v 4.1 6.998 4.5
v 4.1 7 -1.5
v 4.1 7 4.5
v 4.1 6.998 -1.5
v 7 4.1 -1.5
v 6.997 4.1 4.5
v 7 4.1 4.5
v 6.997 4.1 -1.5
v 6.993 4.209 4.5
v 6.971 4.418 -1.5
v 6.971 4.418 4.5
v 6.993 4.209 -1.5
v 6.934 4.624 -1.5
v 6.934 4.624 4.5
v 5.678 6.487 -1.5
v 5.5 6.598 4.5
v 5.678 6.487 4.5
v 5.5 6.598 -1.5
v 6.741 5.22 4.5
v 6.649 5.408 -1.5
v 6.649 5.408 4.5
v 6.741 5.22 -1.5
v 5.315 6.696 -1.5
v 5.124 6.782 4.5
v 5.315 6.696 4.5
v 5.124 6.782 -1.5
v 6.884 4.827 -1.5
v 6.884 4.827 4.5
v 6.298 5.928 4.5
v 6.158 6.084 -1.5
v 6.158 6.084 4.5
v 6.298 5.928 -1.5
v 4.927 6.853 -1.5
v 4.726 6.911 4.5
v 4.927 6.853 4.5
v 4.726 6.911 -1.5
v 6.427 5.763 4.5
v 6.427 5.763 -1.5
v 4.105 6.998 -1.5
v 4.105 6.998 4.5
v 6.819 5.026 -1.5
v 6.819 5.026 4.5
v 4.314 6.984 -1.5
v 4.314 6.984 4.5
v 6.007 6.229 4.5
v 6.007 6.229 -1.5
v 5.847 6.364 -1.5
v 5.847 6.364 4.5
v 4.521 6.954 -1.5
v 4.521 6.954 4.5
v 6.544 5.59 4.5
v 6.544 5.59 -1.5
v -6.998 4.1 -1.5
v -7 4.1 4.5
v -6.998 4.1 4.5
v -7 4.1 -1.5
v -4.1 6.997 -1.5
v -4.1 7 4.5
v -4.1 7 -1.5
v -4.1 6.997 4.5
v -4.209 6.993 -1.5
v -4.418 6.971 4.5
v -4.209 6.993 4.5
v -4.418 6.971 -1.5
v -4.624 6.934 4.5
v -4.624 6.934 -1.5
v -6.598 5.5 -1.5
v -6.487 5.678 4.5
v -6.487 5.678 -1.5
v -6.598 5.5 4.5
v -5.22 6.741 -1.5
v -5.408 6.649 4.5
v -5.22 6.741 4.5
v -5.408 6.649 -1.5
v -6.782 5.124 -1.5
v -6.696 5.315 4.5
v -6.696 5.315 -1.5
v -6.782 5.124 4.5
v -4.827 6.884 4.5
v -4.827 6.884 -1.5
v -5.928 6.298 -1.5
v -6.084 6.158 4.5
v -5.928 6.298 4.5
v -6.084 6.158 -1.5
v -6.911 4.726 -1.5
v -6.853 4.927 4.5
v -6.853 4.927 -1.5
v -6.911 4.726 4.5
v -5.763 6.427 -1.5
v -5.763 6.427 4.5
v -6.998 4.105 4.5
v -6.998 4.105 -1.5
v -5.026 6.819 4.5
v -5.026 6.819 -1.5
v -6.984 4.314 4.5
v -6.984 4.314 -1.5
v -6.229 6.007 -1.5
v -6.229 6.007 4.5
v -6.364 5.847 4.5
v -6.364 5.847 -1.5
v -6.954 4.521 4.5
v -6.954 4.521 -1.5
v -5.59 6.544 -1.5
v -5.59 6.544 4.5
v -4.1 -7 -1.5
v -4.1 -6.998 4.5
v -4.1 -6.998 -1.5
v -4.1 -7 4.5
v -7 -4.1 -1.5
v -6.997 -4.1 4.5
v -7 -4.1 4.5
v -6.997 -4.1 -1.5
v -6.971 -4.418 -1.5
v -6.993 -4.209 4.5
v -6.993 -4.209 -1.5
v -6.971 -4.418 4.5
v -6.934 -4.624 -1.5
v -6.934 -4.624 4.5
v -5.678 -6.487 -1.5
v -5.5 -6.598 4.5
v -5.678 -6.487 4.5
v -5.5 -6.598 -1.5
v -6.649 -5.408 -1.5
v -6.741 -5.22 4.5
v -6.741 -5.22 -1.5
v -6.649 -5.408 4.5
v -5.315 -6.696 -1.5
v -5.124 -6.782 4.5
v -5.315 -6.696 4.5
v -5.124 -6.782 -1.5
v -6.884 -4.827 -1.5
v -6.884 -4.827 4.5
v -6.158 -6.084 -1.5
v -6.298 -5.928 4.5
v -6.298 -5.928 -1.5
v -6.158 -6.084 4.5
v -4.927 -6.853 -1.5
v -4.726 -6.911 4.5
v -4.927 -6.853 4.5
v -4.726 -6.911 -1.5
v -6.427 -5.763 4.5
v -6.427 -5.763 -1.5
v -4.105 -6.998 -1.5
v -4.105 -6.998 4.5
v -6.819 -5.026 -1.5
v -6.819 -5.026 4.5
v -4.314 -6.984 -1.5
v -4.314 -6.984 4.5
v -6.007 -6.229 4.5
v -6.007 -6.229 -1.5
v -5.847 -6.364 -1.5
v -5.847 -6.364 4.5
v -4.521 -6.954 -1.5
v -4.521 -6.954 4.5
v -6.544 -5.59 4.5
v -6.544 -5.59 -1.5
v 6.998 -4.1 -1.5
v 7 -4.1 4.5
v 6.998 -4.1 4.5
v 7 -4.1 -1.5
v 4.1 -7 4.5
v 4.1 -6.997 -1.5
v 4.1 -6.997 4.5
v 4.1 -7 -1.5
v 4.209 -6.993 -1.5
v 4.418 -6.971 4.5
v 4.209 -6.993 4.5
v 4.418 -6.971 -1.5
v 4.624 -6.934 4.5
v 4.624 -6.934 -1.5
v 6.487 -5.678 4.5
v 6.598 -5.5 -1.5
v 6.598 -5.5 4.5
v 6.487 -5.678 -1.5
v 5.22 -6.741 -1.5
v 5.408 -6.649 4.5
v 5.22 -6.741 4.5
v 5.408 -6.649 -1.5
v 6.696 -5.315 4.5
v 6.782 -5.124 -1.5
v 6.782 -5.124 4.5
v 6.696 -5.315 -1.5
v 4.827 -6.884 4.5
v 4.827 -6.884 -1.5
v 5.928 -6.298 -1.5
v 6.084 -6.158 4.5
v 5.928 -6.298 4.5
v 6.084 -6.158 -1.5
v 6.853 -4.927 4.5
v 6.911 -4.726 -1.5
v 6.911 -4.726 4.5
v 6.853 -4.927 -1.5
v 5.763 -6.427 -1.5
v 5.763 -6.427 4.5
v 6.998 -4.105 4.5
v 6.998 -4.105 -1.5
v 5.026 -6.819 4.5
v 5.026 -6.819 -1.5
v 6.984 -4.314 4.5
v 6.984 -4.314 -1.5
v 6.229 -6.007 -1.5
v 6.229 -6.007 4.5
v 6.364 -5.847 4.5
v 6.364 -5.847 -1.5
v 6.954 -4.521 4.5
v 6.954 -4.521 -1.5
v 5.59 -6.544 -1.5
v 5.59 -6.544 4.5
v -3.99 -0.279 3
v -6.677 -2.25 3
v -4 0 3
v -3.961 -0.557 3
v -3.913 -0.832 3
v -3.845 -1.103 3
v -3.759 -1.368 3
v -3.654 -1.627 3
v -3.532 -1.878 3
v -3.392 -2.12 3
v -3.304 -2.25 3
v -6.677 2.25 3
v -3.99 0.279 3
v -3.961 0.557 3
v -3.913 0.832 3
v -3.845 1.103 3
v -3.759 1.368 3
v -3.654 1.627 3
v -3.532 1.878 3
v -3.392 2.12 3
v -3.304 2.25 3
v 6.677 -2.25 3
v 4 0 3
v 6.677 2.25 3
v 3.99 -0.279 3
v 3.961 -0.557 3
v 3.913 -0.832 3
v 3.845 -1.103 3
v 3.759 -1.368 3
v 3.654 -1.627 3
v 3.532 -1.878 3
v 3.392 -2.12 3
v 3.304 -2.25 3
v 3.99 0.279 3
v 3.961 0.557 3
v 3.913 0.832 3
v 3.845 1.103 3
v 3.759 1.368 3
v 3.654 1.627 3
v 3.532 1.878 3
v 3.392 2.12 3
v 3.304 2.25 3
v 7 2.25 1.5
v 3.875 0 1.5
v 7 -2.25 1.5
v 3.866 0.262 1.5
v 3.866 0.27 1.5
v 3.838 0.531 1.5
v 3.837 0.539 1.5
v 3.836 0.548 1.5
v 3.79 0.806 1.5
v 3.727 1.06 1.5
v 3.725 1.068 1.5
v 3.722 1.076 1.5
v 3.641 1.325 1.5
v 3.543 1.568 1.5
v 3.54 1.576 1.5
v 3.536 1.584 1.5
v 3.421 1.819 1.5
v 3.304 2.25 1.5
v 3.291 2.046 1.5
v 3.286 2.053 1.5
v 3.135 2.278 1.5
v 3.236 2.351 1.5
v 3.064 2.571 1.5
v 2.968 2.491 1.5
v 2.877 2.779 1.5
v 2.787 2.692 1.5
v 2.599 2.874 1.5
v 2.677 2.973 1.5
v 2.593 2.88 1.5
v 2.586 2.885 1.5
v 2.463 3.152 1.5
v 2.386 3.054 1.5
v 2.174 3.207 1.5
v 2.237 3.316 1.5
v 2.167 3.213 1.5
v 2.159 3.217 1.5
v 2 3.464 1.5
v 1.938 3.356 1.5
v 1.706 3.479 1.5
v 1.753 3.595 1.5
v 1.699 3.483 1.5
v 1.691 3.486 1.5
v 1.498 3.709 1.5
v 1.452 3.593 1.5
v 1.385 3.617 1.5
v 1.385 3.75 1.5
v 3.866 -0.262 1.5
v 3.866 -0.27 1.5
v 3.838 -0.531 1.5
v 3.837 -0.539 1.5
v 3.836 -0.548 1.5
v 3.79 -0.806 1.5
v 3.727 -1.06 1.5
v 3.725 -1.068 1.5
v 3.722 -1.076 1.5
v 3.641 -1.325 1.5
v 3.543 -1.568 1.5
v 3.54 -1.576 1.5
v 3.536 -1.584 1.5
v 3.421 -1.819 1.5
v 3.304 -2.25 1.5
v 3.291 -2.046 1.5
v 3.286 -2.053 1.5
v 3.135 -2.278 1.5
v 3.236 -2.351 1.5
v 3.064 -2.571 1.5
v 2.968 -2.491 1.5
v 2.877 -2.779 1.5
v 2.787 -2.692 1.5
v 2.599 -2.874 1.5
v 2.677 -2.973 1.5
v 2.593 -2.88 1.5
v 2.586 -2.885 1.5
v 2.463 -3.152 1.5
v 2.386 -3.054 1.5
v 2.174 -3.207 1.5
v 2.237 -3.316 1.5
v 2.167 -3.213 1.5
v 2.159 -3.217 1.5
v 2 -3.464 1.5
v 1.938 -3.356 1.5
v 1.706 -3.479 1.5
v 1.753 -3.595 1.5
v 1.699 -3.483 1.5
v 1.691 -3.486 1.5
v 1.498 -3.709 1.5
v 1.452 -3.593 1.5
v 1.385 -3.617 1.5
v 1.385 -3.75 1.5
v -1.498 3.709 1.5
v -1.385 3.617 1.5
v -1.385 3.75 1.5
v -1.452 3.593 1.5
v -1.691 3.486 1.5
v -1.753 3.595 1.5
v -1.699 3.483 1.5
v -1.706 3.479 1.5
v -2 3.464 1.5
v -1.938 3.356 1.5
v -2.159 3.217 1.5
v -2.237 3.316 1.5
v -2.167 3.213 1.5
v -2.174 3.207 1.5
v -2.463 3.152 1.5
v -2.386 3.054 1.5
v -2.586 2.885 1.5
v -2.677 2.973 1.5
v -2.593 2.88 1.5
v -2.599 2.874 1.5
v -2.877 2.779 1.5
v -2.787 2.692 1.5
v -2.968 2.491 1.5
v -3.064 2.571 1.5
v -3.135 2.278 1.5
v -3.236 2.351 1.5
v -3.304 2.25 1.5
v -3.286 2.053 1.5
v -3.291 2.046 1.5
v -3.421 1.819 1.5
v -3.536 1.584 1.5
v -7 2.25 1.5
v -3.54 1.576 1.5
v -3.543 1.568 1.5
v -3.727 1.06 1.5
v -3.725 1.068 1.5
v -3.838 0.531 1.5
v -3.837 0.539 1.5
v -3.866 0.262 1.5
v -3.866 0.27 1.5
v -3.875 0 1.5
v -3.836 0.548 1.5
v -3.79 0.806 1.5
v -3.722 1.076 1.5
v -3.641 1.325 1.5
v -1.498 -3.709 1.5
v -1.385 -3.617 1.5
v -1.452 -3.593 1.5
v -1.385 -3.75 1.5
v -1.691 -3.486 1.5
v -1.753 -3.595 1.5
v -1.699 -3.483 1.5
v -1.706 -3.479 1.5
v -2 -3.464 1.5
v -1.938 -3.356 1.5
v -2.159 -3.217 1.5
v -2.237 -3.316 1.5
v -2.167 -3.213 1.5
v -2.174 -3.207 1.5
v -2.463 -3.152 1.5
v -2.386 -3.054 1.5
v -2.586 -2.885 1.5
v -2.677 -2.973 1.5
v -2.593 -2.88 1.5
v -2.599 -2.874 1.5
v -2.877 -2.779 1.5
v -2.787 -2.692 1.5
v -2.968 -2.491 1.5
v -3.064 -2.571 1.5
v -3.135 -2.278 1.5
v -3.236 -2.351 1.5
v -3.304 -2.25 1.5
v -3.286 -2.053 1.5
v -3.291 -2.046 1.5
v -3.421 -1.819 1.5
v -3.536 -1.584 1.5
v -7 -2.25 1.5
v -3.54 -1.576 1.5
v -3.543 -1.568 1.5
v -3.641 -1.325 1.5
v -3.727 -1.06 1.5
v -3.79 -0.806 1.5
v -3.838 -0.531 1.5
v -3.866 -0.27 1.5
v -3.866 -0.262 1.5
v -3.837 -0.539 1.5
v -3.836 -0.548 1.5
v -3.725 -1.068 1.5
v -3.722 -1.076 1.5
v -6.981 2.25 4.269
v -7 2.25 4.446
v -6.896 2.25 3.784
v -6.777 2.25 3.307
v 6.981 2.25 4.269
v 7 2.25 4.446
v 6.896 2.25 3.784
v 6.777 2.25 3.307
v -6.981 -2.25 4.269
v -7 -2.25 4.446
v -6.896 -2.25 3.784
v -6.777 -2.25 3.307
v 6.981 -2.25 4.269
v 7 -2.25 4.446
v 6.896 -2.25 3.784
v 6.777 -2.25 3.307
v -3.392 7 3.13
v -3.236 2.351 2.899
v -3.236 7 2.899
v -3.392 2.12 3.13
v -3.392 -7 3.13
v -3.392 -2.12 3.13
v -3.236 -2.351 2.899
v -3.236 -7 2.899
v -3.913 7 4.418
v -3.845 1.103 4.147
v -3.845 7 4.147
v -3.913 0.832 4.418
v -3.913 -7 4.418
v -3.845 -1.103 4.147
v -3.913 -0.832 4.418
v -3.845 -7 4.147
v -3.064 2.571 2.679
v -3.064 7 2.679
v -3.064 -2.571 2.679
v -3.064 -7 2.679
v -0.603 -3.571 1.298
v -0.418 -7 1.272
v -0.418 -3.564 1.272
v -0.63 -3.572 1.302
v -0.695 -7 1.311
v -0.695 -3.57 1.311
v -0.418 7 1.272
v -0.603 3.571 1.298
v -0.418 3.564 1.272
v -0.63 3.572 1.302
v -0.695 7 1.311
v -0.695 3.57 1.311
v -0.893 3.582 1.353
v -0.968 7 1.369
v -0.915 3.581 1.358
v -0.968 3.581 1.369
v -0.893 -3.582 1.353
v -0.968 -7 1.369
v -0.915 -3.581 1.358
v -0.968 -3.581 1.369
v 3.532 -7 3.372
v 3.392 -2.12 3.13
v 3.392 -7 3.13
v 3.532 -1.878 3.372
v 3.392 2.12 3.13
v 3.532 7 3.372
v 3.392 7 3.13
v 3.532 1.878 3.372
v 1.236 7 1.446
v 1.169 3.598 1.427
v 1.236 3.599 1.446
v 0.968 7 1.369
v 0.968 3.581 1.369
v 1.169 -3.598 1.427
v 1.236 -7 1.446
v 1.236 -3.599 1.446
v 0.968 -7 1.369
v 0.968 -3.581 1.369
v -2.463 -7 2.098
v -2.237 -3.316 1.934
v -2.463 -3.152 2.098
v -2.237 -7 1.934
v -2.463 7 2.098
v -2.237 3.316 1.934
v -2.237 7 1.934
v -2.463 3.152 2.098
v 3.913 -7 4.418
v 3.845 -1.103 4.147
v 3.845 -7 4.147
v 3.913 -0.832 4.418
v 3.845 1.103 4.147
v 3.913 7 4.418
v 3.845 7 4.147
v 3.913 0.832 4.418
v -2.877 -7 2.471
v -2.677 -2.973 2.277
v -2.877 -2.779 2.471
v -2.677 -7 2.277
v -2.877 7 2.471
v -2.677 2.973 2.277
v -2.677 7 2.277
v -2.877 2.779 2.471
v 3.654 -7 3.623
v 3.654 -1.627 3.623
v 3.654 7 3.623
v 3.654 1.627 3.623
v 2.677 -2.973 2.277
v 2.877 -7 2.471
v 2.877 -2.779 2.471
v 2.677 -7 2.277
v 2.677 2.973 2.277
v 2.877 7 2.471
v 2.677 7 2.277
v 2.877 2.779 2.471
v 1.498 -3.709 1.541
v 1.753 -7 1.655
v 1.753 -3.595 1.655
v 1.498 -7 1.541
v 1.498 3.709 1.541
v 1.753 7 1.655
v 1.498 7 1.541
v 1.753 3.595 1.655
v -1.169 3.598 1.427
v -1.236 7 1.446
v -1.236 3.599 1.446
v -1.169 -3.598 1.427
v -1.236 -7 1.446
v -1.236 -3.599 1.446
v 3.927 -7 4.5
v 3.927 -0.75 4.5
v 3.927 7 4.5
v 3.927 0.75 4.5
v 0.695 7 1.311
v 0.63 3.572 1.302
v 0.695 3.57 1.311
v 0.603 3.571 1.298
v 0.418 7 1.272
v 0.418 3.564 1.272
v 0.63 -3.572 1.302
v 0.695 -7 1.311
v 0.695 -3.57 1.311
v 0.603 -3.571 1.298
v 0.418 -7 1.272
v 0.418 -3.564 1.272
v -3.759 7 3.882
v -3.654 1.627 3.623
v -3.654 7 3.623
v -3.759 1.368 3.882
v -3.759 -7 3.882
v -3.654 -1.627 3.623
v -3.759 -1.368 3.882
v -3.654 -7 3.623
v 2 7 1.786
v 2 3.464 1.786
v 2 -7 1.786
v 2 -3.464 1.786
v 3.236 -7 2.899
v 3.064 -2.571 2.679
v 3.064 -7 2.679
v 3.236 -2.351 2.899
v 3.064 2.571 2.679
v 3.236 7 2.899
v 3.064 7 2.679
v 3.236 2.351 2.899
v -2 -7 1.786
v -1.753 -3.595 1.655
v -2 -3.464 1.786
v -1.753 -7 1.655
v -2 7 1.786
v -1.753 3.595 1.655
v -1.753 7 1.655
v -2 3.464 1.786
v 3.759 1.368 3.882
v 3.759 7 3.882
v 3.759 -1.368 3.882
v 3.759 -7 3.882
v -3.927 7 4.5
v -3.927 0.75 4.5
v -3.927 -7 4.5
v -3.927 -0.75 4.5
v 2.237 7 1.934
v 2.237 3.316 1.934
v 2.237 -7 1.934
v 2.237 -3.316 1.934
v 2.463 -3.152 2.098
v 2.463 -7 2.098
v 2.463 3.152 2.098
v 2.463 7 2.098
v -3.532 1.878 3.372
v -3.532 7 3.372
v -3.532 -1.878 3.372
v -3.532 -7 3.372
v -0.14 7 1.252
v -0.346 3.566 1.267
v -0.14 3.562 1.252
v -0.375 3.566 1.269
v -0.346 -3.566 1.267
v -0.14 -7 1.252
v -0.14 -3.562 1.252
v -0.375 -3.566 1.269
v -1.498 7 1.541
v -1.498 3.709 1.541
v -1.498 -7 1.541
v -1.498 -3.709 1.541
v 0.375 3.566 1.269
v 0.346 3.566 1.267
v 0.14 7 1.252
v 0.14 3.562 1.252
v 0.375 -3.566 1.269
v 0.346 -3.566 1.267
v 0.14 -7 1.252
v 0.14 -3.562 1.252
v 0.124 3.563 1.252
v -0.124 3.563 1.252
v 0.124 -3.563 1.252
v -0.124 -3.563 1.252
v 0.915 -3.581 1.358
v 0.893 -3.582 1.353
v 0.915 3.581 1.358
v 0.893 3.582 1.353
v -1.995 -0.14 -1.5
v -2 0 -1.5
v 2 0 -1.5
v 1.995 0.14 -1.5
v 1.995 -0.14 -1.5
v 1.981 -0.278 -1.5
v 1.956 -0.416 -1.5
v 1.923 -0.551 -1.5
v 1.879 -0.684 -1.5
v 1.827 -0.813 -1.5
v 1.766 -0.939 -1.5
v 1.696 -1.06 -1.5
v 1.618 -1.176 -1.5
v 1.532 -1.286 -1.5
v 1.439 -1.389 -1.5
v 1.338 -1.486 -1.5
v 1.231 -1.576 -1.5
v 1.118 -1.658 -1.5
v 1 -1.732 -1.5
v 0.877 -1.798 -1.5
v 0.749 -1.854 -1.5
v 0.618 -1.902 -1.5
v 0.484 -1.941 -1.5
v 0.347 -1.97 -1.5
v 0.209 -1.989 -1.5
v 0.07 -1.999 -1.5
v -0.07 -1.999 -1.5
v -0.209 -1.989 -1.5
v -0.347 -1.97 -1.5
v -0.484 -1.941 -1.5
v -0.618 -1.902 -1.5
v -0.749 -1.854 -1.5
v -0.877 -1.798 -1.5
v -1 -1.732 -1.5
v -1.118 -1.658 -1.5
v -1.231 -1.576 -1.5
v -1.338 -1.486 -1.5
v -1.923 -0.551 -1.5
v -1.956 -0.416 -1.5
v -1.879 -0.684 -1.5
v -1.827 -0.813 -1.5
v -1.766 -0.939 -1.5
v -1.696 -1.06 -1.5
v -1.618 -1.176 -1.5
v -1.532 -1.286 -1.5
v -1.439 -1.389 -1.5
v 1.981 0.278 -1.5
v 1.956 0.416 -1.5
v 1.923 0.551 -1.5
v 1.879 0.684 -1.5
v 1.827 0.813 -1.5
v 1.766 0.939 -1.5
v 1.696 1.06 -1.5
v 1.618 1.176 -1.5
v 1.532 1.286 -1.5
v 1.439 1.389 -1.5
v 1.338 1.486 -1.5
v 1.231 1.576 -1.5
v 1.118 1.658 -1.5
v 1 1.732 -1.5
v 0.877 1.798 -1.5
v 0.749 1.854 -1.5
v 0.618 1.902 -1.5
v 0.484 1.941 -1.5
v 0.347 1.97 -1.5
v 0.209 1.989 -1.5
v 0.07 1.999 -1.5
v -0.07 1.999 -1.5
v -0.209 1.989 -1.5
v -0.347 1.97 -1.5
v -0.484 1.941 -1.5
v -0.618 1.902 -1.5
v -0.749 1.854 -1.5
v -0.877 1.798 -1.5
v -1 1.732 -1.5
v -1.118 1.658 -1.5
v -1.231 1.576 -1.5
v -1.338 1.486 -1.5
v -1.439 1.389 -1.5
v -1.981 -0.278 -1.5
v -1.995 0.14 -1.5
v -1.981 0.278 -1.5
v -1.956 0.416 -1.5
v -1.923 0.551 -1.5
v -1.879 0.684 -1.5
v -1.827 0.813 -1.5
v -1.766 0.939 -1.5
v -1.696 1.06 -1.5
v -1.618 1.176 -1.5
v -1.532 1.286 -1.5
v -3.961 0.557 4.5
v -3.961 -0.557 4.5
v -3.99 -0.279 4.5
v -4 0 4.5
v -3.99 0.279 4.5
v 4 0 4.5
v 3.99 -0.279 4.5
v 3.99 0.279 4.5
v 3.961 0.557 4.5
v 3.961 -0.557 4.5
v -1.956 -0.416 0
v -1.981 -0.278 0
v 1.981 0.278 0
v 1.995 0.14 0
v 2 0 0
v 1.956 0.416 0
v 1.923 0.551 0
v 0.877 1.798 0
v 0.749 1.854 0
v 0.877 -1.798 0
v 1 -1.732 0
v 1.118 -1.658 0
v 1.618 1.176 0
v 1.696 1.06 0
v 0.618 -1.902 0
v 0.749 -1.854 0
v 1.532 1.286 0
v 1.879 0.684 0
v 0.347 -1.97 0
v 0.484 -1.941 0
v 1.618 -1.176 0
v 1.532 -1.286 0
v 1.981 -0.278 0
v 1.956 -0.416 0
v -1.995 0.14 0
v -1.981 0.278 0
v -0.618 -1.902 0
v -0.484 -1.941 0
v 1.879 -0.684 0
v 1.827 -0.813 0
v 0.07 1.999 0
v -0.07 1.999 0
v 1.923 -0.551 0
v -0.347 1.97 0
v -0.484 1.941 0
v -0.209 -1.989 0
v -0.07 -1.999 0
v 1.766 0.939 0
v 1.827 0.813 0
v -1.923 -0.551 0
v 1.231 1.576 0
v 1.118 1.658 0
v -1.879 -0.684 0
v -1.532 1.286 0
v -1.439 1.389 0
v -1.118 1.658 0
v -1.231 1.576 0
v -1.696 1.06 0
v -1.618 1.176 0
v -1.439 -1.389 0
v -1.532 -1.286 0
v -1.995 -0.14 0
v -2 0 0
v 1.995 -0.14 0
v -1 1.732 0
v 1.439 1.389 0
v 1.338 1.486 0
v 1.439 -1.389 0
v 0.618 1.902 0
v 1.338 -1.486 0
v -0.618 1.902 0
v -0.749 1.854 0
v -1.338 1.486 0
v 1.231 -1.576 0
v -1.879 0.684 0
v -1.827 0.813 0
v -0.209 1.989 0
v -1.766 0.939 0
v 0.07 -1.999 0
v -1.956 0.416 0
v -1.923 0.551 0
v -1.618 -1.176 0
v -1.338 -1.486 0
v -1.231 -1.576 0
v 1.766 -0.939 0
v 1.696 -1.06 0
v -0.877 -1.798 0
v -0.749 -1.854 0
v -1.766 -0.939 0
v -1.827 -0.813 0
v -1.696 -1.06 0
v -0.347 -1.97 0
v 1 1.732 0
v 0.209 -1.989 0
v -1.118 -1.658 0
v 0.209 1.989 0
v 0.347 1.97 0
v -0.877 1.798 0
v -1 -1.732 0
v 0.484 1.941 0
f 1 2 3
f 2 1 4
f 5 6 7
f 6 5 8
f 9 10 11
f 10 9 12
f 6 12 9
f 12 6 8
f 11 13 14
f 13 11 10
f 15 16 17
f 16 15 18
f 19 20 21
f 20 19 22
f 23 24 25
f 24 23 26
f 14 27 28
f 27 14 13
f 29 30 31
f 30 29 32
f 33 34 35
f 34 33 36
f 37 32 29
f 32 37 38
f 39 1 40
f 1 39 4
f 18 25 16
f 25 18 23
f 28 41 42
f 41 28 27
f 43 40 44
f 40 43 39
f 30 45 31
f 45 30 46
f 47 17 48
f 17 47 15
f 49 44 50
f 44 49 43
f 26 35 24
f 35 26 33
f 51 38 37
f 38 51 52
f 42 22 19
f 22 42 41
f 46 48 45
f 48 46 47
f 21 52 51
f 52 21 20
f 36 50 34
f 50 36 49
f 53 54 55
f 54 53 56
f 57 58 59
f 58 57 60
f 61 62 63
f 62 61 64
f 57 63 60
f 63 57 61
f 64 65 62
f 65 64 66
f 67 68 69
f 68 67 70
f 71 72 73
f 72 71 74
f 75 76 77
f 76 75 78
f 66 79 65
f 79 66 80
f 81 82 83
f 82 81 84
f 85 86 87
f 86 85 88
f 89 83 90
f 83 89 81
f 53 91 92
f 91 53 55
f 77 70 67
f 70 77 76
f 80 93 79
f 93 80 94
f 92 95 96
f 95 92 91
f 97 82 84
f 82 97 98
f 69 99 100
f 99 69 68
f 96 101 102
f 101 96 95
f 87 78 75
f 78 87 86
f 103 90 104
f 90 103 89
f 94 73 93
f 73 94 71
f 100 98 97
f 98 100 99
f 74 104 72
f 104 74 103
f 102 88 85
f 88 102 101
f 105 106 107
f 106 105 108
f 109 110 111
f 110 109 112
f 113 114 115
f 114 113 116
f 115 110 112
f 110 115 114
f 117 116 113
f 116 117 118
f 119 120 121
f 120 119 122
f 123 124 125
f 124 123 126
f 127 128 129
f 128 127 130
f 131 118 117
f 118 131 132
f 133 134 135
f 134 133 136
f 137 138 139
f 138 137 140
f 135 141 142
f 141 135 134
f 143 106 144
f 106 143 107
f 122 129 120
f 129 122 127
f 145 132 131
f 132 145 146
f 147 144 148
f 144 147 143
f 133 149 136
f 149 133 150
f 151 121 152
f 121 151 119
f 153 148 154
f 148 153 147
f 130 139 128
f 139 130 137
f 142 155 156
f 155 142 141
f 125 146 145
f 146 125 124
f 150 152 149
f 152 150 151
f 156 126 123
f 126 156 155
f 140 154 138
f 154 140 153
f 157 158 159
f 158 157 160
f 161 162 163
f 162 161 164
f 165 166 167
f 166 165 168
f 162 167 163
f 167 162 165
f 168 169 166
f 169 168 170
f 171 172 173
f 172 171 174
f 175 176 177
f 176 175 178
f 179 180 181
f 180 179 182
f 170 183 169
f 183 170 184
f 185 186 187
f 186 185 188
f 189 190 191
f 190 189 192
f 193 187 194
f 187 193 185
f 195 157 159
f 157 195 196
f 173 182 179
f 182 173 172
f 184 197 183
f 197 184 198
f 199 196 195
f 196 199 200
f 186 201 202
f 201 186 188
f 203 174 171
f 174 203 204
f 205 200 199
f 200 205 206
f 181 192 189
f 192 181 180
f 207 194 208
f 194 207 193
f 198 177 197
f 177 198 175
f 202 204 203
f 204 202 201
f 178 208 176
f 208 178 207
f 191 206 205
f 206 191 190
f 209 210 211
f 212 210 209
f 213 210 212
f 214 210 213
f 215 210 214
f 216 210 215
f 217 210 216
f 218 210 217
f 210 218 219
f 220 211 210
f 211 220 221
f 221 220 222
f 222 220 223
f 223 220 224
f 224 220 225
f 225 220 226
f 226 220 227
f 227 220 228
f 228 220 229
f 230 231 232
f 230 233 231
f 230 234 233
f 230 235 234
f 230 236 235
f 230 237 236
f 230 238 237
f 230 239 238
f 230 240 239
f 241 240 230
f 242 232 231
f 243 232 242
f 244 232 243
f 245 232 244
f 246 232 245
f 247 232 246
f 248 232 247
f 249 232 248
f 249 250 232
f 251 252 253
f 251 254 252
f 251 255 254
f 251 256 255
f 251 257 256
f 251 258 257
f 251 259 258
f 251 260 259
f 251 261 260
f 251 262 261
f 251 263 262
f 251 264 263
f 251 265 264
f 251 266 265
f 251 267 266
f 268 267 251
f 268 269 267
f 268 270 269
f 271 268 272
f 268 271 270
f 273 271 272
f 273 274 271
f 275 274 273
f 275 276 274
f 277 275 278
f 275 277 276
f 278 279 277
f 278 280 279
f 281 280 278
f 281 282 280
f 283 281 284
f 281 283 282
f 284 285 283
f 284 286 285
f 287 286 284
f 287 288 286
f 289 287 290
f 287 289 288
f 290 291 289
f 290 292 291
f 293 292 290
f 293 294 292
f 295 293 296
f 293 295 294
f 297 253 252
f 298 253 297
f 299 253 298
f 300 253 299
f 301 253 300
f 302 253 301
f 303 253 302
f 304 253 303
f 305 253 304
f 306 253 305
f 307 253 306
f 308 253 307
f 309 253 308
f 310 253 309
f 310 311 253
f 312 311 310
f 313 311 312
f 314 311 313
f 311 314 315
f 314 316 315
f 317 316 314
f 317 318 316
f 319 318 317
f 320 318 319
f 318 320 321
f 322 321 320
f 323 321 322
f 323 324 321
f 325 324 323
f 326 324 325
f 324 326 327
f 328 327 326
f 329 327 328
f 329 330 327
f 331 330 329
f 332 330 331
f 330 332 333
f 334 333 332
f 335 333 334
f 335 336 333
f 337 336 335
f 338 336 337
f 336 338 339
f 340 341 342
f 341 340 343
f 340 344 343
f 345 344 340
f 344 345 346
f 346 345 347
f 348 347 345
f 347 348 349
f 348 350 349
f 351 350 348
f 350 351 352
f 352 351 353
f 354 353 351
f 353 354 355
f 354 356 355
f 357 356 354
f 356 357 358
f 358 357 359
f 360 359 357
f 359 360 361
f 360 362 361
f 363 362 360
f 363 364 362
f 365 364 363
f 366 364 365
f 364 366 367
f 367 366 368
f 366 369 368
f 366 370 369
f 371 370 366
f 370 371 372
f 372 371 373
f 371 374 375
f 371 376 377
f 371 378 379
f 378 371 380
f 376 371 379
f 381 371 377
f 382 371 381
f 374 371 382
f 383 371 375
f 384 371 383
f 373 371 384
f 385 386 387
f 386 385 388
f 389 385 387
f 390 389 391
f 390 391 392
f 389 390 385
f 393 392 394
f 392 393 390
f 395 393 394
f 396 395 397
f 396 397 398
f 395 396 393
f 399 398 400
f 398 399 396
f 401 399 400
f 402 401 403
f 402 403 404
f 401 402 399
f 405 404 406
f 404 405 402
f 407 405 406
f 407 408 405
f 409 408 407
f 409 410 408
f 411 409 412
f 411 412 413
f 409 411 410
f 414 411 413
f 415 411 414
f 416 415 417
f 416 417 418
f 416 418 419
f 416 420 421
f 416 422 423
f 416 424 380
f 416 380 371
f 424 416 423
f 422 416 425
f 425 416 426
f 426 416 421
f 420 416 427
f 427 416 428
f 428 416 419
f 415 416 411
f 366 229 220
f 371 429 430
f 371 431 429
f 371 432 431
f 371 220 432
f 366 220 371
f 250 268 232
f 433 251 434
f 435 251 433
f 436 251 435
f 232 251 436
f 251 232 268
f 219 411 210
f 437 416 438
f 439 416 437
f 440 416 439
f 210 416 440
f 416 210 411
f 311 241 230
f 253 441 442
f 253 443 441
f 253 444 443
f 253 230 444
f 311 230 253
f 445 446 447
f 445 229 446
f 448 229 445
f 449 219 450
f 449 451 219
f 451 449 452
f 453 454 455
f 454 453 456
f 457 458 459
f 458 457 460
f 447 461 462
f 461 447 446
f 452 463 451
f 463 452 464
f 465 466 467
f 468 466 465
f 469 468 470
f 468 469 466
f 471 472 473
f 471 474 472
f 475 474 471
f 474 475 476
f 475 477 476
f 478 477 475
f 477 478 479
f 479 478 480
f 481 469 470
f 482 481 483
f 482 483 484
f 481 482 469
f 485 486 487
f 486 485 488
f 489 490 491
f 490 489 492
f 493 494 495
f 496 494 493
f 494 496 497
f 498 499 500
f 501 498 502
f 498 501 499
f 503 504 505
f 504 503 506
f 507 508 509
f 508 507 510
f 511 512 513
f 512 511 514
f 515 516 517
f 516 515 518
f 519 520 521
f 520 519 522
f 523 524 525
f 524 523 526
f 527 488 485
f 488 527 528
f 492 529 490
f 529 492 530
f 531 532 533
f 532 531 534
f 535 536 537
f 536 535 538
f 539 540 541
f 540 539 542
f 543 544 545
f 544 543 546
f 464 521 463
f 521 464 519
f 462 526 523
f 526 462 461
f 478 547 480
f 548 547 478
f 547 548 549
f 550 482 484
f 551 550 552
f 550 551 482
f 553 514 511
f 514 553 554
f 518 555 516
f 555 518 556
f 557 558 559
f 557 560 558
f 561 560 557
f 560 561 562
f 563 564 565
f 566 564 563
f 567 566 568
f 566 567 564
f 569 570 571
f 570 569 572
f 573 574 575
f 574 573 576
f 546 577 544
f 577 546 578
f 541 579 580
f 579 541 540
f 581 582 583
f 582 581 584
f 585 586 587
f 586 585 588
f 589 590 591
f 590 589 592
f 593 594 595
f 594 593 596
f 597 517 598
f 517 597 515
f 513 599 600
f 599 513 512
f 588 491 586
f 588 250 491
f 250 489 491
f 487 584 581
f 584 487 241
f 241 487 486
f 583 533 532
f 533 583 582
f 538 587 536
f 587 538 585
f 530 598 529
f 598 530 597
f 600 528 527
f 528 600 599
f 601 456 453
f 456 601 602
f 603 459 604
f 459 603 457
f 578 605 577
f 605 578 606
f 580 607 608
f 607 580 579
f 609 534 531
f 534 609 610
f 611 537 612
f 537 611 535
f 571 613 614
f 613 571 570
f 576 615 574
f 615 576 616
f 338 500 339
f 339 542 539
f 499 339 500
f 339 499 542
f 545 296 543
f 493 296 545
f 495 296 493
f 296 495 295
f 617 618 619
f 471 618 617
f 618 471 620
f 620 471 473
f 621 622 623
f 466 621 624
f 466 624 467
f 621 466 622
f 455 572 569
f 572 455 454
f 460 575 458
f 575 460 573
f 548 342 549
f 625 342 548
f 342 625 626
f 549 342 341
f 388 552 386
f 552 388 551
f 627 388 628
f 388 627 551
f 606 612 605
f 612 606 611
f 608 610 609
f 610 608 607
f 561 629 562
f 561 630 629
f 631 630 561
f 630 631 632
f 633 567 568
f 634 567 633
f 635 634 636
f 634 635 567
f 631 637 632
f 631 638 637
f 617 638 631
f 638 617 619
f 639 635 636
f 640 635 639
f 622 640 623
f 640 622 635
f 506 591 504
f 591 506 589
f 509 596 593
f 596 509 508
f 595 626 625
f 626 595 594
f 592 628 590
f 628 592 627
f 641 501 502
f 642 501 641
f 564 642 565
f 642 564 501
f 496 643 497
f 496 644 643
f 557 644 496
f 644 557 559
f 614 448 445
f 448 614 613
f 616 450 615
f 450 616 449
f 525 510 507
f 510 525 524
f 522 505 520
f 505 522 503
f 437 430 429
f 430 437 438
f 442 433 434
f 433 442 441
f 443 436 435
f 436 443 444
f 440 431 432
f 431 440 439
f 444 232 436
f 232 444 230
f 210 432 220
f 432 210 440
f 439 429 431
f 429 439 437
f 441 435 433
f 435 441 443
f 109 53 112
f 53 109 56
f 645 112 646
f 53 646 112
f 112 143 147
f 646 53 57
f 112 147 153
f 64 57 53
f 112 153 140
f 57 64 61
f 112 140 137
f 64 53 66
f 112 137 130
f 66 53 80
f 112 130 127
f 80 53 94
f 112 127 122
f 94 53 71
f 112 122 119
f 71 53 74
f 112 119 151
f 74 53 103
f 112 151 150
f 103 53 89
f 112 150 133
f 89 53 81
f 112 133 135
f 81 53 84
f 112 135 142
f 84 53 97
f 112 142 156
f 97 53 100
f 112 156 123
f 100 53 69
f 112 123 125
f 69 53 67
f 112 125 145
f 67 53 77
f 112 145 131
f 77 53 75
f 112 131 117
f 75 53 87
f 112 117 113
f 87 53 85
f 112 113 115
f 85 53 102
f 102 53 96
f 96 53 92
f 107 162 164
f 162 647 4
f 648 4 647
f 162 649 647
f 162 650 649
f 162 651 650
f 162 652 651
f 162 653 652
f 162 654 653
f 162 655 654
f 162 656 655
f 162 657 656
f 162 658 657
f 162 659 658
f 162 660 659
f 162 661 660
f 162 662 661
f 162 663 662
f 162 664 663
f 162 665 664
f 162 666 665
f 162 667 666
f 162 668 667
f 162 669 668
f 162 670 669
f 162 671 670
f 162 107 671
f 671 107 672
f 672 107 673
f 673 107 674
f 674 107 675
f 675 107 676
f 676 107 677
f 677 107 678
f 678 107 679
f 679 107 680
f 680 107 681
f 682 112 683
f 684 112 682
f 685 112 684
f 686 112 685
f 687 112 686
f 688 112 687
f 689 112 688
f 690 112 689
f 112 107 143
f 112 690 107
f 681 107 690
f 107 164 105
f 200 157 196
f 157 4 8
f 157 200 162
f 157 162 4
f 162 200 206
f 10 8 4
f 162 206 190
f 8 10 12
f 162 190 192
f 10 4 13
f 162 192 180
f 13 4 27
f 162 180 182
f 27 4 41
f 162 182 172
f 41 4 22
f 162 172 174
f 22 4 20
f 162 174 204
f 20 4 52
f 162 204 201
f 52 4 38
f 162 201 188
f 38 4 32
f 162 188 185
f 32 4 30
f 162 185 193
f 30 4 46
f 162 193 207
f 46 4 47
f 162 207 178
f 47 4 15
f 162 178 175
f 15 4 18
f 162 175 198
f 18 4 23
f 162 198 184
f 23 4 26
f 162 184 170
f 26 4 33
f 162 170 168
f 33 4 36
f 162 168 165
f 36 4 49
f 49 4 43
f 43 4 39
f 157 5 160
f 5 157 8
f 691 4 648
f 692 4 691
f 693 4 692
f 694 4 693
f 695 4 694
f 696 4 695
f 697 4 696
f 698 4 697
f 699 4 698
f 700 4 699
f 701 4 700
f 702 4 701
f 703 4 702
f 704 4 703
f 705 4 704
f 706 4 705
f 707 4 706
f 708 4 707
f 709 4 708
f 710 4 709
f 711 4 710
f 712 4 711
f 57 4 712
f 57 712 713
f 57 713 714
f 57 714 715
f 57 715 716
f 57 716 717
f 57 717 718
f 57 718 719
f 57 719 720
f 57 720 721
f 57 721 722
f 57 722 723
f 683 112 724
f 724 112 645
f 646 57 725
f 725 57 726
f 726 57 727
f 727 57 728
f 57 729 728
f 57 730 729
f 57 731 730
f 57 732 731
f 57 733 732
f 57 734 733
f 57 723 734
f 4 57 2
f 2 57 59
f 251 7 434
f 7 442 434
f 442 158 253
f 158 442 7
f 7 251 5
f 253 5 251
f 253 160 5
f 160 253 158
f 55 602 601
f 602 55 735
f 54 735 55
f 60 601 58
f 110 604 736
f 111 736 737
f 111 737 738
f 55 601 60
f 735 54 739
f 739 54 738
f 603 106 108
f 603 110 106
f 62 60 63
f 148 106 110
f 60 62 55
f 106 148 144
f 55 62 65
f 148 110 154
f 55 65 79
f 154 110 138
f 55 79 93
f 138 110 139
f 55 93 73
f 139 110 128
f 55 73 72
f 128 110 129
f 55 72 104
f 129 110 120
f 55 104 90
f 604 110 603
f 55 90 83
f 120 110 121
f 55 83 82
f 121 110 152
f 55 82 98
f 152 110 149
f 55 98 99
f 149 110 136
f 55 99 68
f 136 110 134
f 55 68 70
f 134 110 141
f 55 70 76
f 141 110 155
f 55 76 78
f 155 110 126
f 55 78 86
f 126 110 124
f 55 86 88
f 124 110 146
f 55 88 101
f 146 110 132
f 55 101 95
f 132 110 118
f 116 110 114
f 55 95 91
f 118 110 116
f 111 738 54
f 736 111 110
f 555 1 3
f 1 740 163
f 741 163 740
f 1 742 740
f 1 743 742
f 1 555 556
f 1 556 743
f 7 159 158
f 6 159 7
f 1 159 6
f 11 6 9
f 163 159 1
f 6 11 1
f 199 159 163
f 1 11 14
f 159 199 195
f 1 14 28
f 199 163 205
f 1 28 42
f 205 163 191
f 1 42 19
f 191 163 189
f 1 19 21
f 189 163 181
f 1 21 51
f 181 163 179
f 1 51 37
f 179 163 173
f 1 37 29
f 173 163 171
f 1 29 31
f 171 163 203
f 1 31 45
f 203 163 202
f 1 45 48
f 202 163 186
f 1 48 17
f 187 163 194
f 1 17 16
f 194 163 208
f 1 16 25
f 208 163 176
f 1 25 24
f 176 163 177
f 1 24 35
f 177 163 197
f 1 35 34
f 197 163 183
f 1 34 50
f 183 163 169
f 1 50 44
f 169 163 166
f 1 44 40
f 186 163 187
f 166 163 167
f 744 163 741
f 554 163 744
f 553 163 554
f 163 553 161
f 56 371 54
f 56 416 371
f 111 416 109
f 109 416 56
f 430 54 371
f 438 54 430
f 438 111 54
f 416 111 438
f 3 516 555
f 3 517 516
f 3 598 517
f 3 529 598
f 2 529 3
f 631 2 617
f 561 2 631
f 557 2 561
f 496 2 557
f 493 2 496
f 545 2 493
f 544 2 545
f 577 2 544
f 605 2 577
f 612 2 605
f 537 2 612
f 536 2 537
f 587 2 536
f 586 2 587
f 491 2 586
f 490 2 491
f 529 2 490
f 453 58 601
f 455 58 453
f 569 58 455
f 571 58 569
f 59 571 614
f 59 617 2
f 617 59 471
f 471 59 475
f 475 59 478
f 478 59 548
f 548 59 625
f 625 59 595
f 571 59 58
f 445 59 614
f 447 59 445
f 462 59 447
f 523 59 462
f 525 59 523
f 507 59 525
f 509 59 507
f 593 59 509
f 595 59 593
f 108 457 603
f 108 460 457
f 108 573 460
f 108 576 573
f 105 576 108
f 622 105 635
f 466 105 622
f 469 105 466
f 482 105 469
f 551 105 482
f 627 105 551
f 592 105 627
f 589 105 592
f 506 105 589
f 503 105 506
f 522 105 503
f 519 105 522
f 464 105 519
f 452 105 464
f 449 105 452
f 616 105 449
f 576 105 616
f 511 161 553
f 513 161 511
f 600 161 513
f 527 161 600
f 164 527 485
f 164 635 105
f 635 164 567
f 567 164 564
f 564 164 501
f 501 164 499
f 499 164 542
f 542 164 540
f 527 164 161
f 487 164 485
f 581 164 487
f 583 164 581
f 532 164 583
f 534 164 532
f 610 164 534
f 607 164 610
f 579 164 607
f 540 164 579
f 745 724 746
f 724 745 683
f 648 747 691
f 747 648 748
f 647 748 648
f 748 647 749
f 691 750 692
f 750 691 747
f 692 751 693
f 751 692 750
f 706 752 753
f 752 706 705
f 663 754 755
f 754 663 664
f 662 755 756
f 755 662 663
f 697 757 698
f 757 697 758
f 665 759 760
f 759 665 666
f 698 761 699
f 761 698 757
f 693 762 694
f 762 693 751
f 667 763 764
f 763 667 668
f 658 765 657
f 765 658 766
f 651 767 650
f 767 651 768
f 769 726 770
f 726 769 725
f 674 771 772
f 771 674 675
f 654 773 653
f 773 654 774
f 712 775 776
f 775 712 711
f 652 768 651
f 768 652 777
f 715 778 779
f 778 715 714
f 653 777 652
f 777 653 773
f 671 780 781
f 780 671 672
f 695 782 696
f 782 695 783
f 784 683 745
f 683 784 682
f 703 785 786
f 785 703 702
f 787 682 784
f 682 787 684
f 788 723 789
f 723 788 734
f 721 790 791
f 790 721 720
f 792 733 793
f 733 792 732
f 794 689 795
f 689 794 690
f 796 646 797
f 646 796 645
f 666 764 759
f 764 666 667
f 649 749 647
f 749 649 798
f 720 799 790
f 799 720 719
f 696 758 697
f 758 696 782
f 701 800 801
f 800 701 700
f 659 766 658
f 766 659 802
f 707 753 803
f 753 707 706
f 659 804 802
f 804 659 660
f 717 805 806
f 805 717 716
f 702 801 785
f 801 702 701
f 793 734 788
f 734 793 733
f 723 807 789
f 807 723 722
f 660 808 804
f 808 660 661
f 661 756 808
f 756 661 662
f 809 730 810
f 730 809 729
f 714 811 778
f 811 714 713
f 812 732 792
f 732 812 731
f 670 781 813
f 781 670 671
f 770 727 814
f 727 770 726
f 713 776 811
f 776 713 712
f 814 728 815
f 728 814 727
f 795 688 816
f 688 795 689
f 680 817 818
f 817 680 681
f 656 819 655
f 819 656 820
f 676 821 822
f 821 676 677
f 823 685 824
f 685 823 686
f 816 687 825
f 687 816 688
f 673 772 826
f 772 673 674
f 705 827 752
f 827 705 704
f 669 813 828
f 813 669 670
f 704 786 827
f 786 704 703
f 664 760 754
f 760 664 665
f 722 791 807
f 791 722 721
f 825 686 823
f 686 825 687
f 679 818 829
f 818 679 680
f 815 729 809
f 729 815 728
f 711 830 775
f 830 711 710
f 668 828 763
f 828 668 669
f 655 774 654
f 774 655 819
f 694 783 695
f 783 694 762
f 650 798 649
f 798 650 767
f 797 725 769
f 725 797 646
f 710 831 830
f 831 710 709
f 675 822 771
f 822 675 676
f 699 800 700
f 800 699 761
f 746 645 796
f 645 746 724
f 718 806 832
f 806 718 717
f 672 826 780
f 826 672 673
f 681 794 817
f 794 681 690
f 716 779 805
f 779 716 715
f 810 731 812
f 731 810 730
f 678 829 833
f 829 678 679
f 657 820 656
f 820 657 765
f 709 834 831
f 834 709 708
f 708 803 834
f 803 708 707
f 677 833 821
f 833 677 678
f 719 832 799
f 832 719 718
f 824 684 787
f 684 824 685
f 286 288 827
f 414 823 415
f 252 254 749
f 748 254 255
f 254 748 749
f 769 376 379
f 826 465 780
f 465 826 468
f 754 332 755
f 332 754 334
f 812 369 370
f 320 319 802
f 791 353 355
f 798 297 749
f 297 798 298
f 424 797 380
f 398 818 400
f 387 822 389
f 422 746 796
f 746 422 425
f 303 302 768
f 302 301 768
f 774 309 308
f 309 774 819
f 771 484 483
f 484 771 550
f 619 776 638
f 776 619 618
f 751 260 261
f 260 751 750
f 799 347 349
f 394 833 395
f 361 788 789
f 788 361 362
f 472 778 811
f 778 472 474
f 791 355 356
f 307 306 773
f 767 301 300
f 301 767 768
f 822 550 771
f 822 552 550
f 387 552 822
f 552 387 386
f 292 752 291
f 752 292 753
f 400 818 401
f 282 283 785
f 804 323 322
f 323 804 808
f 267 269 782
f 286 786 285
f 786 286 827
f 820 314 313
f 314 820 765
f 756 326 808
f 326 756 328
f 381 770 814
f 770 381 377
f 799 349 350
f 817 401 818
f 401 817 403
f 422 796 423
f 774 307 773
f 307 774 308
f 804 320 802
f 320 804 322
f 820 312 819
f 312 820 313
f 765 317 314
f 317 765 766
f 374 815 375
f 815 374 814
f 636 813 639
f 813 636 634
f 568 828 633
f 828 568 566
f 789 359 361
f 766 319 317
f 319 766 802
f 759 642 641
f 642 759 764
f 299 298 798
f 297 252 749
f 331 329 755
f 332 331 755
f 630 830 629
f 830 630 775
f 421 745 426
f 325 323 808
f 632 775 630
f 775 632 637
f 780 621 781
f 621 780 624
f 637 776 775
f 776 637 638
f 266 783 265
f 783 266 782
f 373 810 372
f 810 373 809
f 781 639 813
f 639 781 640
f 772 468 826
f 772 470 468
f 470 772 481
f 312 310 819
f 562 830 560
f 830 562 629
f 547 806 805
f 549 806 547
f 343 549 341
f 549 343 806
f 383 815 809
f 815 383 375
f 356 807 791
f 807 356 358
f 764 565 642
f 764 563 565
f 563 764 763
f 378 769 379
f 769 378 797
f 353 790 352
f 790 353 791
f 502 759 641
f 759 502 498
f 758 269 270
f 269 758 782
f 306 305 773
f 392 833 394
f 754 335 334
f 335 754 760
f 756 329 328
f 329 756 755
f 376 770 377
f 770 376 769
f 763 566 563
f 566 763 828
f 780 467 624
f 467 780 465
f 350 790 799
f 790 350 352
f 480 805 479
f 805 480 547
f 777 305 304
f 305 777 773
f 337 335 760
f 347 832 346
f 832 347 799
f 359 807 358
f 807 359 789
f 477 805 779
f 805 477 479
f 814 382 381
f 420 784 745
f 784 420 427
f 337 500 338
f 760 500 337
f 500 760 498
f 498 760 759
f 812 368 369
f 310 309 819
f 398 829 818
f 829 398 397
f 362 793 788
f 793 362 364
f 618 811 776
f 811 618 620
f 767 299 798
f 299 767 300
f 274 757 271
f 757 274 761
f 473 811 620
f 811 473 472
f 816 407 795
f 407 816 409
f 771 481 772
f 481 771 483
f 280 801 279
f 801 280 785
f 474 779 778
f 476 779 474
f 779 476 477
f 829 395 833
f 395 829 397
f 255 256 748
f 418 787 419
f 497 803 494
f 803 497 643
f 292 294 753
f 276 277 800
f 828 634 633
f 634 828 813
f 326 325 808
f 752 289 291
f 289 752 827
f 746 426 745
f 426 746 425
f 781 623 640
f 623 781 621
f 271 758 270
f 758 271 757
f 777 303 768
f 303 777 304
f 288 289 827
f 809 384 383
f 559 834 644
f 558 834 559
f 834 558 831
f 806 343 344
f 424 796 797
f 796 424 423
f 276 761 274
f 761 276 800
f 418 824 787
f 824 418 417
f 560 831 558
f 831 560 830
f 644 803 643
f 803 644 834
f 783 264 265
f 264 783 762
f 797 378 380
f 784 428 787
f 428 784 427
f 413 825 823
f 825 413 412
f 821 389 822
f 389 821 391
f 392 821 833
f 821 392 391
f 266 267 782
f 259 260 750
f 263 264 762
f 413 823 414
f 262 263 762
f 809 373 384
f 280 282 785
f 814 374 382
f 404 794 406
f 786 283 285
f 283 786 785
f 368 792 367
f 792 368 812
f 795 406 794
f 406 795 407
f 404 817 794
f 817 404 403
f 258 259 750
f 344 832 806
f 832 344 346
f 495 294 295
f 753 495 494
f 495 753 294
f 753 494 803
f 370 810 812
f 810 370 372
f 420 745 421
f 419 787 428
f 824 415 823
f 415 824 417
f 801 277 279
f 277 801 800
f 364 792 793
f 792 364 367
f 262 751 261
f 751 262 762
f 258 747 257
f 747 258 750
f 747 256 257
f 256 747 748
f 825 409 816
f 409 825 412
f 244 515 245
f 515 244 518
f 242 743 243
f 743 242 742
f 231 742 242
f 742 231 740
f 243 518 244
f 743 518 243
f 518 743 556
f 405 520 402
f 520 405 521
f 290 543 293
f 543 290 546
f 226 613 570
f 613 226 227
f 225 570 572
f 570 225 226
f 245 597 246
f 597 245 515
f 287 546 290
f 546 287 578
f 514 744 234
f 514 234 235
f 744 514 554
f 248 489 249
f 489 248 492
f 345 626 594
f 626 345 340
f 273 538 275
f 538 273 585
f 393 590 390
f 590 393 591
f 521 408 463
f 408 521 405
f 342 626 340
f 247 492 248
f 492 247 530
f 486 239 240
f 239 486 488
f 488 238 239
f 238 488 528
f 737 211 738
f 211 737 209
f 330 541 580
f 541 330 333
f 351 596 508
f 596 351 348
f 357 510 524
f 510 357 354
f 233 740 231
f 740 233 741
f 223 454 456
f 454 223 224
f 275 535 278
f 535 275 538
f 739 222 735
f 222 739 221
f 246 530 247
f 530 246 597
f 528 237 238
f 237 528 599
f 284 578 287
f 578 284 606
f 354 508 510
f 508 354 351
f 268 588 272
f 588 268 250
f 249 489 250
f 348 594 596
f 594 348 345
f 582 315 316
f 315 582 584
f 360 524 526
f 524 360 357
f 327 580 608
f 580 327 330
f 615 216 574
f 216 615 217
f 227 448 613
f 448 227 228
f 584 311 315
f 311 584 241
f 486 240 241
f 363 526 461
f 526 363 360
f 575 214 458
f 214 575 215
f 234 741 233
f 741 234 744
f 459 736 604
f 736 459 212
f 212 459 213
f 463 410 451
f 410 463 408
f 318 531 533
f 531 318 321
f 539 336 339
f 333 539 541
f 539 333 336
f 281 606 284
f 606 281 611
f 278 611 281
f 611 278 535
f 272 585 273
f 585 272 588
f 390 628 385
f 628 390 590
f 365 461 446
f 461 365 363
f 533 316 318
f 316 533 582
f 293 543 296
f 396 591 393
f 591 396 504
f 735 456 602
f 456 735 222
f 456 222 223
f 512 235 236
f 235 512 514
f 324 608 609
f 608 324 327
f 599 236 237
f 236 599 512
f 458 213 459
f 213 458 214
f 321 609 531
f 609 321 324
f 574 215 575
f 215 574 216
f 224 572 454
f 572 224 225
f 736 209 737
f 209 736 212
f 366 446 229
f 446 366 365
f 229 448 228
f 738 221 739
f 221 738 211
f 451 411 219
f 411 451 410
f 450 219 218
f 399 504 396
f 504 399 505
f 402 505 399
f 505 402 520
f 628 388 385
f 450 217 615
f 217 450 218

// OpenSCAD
// Curve Subdivision:
$fn=90;
// Cable Diameter:
diametro_cavo = 8;
// Base Lenght:
base_dim = 14;
// Base Height:
base_alt = 3;
// Fillet Radius:
raggio_smussatura = 3;
// Hole Diameter:
diametro_foro = 4;
// Tie Height:
altezza_fascetta = 1.5;
// Tie Width:
larghezza_fascetta = 4.5;


// This is just to make differences...
addendum = 0.1;

ferma_cavo();

module ferma_cavo() {
    difference() {
        // Base:
        translate([0,0,base_alt/2]) cube([base_dim, base_dim, base_alt*2], center = true);
        // Smussi:
        for (i=[0,90,180,270]) {
            rotate([0,0,i]) difference() {
                translate([base_dim/2-raggio_smussatura/2+addendum, base_dim/2-raggio_smussatura/2+addendum, 0]) cube([raggio_smussatura, raggio_smussatura, base_alt*4], center=true);
                translate([base_dim/2-raggio_smussatura, base_dim/2-raggio_smussatura, 0]) cylinder(h=base_alt*4, r=raggio_smussatura,center=true);
            }
        }
        // Svaso:
        cylinder(h=base_alt+addendum, d=diametro_foro, center=true);
        cylinder(h=base_alt/2+addendum, r1=diametro_foro/2, r2=diametro_foro);
        // Foro Cacciavite:
        translate([0,0,base_alt/2]) cylinder(h=base_alt, d=diametro_foro*2.0);
        // Passaggi Fascette:
        translate([0,0,base_alt/2+altezza_fascetta/2]) {
            cube([base_dim*2, larghezza_fascetta, altezza_fascetta], center=true);
            translate([0,0,base_alt]) rotate([90,0,0]) cylinder(d=diametro_cavo, h=base_dim*2, center=true);
        }
        // Smussature Fascette:
        difference() {
            translate([0,0,base_alt*1.5+altezza_fascetta/2]) rotate([90,0,0]) difference() {
                cylinder(d=base_dim+altezza_fascetta*2, h=larghezza_fascetta, center=true);
                cylinder(d=base_dim+addendum, h=larghezza_fascetta+addendum, center=true);
            }
            translate([0,0,0]) cube([base_dim*2, base_dim*2,base_alt], center=true);
        }
    }
}
